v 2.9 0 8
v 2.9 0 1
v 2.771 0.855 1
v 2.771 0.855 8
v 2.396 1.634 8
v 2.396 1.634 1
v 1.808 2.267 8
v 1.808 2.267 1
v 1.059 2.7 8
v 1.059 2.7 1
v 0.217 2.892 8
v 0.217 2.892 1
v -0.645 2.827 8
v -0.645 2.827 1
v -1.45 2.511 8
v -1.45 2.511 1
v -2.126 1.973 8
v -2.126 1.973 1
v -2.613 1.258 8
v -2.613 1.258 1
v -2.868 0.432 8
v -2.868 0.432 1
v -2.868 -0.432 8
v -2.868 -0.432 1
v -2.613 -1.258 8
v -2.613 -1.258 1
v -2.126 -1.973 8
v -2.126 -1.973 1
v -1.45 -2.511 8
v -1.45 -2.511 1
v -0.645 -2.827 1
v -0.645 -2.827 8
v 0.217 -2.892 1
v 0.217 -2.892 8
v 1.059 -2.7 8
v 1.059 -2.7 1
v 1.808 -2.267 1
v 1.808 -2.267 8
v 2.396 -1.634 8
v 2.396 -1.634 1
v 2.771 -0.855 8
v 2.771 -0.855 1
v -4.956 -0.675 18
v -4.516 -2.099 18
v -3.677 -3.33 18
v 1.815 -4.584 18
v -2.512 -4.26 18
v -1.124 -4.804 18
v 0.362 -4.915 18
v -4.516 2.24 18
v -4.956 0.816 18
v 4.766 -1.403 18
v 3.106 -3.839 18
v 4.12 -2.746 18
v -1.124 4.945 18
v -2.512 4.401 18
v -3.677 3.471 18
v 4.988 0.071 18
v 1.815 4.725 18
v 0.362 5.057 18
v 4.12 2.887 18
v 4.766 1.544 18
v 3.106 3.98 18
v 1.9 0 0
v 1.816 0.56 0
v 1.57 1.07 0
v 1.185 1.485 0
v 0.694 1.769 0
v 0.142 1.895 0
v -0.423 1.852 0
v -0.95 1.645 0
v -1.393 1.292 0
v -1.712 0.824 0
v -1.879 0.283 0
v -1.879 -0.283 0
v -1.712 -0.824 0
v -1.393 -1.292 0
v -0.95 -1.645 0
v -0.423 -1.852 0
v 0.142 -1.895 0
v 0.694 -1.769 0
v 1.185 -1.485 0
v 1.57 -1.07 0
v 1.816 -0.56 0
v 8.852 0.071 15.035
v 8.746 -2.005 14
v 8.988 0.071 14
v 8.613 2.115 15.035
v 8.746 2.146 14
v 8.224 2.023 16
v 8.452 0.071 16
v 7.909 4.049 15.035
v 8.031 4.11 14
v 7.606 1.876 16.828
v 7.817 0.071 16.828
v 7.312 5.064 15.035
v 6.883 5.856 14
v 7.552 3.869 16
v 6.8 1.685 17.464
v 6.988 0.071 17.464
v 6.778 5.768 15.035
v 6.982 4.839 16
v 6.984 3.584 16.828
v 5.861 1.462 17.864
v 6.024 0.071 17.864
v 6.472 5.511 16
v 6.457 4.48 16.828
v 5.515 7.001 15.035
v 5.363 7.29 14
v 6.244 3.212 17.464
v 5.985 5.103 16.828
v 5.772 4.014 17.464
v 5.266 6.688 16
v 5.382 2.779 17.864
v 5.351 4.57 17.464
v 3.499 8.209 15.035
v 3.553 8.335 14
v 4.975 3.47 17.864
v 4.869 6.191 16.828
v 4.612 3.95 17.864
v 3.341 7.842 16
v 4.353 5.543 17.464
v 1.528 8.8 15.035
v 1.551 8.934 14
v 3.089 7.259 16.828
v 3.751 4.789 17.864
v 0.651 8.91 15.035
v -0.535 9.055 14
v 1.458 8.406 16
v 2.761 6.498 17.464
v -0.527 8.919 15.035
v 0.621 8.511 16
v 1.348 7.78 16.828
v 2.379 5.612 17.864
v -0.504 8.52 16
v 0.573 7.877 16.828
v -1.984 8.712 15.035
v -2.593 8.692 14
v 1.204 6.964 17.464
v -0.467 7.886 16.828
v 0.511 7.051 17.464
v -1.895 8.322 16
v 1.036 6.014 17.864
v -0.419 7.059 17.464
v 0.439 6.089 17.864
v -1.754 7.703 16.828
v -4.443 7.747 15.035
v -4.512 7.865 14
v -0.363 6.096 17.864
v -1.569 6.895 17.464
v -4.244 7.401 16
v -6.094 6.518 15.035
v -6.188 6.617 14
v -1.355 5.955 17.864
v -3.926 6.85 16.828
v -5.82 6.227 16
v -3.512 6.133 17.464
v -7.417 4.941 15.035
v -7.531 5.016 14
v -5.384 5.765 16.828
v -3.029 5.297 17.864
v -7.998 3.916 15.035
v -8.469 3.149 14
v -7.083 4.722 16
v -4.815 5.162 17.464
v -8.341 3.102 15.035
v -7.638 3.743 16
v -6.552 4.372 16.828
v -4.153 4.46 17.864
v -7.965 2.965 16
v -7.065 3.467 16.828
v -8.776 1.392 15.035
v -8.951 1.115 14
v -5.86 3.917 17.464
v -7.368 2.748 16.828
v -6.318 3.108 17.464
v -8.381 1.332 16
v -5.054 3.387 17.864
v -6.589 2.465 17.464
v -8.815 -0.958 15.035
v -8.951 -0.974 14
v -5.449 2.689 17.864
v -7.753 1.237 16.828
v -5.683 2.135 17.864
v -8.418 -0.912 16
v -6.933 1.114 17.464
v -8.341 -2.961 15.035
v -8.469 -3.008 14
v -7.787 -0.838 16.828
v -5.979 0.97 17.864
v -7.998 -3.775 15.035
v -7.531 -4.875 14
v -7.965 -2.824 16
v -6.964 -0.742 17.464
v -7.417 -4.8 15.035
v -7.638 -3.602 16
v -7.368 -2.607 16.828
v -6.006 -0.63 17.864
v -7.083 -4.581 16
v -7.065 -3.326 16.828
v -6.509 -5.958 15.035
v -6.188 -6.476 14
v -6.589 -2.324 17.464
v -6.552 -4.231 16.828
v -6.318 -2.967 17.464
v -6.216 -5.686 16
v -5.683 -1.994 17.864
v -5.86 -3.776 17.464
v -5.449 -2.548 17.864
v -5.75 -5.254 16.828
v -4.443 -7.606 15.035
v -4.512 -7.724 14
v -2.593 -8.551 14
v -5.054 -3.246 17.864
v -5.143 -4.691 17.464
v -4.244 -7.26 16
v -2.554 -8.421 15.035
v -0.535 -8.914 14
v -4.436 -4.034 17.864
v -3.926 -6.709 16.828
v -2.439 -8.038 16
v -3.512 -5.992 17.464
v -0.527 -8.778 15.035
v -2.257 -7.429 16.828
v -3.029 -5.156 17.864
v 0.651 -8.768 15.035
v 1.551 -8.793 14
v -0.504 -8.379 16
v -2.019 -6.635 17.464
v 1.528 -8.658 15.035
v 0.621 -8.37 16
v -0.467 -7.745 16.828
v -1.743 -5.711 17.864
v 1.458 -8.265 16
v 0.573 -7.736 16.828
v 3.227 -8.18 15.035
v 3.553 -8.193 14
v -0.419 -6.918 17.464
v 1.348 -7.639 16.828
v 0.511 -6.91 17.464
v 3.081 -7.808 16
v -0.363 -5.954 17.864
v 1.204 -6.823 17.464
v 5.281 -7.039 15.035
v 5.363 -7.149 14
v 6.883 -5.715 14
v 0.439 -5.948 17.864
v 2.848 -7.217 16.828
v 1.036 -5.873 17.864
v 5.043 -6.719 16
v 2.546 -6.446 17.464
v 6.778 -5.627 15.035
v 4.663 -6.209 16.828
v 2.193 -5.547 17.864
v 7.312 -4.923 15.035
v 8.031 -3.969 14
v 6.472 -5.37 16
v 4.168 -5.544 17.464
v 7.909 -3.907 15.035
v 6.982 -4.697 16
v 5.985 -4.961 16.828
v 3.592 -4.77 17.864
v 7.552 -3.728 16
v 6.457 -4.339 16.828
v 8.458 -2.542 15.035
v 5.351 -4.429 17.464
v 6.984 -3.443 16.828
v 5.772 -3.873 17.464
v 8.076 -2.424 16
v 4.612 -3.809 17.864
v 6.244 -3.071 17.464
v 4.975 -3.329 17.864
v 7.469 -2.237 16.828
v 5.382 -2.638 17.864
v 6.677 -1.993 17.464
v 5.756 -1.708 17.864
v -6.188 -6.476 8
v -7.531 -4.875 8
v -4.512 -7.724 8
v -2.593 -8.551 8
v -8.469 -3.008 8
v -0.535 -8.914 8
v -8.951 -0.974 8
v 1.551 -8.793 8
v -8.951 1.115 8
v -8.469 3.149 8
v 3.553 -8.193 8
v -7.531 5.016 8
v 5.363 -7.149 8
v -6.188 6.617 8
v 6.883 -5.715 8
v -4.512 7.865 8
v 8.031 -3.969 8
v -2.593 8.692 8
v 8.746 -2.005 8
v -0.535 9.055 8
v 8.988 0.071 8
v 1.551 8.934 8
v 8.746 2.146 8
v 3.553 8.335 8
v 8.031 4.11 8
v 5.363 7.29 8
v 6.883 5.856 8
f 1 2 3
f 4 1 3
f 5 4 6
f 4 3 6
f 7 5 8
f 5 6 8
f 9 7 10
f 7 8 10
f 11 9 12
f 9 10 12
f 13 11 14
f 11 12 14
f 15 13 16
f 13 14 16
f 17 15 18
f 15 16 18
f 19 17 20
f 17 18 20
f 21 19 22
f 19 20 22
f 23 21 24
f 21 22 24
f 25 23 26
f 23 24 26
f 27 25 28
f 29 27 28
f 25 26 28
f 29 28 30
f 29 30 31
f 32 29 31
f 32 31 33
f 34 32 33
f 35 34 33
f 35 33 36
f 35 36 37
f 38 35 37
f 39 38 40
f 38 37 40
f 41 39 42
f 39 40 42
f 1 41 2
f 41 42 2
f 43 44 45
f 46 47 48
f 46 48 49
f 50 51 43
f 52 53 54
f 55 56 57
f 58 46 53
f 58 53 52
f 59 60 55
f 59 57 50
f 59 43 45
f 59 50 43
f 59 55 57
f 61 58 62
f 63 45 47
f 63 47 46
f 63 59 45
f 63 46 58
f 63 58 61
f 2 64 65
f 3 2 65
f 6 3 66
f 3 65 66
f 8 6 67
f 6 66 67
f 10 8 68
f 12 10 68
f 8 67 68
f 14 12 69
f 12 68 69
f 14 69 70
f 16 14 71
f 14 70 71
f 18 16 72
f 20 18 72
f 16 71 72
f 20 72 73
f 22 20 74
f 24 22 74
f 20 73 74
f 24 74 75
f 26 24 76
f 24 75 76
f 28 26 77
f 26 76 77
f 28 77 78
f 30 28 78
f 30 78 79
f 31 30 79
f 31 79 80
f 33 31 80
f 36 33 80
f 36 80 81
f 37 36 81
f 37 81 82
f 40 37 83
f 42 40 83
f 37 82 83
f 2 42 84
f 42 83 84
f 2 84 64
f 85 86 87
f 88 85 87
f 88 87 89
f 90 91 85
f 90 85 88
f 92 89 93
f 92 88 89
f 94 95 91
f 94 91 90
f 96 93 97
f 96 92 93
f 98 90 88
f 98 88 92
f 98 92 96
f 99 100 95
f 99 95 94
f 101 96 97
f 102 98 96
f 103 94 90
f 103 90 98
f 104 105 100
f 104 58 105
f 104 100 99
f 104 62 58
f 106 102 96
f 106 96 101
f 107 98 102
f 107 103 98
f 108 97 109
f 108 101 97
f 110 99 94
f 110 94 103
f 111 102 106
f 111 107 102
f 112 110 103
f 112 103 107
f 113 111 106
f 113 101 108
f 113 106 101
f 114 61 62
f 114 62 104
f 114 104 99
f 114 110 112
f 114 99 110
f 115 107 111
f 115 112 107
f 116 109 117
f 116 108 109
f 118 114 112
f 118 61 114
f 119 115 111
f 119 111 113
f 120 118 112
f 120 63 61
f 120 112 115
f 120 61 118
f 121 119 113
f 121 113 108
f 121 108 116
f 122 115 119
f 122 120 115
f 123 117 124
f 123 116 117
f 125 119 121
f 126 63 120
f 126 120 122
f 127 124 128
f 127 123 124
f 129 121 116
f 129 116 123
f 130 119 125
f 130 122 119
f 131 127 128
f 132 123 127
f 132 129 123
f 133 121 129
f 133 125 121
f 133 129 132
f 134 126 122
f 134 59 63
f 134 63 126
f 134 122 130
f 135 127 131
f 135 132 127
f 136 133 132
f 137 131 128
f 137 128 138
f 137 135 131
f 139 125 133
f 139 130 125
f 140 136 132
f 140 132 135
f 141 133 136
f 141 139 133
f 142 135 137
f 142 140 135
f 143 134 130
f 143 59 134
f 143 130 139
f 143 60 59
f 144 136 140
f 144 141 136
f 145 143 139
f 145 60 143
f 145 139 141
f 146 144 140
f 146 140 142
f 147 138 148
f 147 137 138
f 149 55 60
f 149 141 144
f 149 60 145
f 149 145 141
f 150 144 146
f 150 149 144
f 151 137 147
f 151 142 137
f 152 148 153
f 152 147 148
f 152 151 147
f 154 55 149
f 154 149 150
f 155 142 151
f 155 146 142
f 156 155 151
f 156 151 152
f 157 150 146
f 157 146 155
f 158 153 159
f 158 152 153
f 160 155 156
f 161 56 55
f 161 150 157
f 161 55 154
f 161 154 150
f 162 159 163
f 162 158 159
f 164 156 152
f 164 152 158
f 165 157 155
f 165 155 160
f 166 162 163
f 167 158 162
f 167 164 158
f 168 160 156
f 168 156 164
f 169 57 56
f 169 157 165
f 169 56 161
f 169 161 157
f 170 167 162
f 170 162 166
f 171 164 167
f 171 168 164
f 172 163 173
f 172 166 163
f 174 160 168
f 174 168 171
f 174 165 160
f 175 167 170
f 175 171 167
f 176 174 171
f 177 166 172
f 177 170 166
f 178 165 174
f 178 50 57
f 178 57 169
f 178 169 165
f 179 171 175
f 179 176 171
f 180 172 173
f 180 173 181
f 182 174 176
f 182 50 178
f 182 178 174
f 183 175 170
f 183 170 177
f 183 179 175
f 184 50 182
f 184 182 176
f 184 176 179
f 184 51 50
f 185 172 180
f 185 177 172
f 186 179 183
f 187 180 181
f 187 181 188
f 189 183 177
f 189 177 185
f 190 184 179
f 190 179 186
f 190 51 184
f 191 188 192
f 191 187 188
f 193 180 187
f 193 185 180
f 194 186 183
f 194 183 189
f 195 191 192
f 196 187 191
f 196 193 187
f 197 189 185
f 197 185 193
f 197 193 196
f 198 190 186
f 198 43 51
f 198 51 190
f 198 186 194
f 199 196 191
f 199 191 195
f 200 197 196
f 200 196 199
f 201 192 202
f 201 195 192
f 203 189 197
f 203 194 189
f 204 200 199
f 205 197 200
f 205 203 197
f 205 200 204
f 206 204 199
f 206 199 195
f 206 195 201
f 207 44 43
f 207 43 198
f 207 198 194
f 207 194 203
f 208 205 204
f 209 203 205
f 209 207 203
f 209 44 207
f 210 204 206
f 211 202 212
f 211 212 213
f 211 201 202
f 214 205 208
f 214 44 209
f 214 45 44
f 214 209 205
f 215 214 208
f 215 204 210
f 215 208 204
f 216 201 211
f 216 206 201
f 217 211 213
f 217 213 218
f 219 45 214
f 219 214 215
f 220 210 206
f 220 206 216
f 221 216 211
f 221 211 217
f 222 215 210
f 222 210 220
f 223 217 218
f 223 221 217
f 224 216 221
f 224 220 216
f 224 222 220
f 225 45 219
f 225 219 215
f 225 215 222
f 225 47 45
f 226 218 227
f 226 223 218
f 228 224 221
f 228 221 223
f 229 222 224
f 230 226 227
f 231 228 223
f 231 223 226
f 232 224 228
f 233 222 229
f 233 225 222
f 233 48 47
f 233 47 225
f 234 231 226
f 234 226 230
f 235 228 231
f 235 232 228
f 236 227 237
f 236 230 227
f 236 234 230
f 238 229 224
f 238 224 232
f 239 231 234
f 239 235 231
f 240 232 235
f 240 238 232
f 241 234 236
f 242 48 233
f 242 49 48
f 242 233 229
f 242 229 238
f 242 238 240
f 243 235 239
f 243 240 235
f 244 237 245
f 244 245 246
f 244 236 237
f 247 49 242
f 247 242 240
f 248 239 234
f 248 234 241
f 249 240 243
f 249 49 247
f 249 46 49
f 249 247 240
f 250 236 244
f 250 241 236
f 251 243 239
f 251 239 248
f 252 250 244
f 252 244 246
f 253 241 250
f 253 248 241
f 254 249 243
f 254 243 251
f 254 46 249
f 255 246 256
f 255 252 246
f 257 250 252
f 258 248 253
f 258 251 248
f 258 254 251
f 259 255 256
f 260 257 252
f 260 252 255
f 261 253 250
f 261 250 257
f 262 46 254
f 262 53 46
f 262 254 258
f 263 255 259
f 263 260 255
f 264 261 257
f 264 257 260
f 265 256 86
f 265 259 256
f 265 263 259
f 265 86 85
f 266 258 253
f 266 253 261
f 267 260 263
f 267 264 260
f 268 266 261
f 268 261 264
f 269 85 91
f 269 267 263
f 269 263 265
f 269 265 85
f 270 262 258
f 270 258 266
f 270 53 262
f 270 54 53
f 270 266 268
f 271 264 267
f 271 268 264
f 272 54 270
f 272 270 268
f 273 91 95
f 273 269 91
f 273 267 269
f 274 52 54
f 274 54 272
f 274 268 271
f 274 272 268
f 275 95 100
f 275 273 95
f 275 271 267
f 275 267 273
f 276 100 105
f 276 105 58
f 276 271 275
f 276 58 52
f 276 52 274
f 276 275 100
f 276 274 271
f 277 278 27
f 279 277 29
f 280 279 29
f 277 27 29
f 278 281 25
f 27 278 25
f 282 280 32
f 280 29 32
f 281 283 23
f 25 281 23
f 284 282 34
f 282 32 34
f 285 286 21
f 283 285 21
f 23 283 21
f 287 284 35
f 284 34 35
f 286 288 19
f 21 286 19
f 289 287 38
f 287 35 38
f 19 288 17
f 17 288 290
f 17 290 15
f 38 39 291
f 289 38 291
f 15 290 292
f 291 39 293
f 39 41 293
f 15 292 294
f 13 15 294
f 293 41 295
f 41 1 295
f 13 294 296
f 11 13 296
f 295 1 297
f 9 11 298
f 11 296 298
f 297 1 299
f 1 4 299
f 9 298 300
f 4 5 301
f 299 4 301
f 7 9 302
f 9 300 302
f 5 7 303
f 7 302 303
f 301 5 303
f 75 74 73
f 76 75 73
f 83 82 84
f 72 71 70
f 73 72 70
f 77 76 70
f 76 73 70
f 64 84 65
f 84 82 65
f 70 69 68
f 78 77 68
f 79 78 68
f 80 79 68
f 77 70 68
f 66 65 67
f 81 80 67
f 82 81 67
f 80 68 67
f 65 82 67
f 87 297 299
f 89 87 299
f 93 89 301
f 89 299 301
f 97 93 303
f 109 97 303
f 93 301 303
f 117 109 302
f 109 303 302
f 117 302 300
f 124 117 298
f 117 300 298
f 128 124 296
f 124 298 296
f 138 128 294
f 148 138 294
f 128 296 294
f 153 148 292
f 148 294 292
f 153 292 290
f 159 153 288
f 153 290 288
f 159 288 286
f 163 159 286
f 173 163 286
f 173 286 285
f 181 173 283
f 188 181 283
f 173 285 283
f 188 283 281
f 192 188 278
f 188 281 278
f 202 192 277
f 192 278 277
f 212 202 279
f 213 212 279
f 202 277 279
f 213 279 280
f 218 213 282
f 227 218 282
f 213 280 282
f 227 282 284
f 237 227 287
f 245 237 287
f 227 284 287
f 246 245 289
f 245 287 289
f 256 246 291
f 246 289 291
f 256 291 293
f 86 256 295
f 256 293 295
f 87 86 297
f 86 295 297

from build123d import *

# Parameters (mm, degrees)
SKETCH_R     = 2.9
PAD_DEPTH    = 8
SKETCH001_R  = 9
PAD001_DEPTH = 10
FILLET_R     = 4
CHAMFER_SIZE = 1


with BuildPart() as part:
    # Sketch → Pad (new body)
    with BuildSketch(Plane.XY):
        Circle(SKETCH_R)
    extrude(amount=PAD_DEPTH)

    # Sketch001 (on Face3 of Pad) → Pad001 (join)
    with BuildSketch(Plane.XY.offset(8)):
        with Locations((-0.011619, 0.070584)):
            Circle(SKETCH001_R)
    extrude(amount=PAD001_DEPTH)

    # Fillet
    fillet_edges = [part.edges().sort_by_distance(p)[0] for p in [
        (-9.011619, 0.070584, 18),
    ]]
    fillet(fillet_edges, radius=FILLET_R)

    # Chamfer
    chamfer_edges = [part.edges().sort_by_distance(p)[0] for p in [
        (-2.9, 0, 0),
    ]]
    chamfer(chamfer_edges, length=CHAMFER_SIZE)


solid = part.part
